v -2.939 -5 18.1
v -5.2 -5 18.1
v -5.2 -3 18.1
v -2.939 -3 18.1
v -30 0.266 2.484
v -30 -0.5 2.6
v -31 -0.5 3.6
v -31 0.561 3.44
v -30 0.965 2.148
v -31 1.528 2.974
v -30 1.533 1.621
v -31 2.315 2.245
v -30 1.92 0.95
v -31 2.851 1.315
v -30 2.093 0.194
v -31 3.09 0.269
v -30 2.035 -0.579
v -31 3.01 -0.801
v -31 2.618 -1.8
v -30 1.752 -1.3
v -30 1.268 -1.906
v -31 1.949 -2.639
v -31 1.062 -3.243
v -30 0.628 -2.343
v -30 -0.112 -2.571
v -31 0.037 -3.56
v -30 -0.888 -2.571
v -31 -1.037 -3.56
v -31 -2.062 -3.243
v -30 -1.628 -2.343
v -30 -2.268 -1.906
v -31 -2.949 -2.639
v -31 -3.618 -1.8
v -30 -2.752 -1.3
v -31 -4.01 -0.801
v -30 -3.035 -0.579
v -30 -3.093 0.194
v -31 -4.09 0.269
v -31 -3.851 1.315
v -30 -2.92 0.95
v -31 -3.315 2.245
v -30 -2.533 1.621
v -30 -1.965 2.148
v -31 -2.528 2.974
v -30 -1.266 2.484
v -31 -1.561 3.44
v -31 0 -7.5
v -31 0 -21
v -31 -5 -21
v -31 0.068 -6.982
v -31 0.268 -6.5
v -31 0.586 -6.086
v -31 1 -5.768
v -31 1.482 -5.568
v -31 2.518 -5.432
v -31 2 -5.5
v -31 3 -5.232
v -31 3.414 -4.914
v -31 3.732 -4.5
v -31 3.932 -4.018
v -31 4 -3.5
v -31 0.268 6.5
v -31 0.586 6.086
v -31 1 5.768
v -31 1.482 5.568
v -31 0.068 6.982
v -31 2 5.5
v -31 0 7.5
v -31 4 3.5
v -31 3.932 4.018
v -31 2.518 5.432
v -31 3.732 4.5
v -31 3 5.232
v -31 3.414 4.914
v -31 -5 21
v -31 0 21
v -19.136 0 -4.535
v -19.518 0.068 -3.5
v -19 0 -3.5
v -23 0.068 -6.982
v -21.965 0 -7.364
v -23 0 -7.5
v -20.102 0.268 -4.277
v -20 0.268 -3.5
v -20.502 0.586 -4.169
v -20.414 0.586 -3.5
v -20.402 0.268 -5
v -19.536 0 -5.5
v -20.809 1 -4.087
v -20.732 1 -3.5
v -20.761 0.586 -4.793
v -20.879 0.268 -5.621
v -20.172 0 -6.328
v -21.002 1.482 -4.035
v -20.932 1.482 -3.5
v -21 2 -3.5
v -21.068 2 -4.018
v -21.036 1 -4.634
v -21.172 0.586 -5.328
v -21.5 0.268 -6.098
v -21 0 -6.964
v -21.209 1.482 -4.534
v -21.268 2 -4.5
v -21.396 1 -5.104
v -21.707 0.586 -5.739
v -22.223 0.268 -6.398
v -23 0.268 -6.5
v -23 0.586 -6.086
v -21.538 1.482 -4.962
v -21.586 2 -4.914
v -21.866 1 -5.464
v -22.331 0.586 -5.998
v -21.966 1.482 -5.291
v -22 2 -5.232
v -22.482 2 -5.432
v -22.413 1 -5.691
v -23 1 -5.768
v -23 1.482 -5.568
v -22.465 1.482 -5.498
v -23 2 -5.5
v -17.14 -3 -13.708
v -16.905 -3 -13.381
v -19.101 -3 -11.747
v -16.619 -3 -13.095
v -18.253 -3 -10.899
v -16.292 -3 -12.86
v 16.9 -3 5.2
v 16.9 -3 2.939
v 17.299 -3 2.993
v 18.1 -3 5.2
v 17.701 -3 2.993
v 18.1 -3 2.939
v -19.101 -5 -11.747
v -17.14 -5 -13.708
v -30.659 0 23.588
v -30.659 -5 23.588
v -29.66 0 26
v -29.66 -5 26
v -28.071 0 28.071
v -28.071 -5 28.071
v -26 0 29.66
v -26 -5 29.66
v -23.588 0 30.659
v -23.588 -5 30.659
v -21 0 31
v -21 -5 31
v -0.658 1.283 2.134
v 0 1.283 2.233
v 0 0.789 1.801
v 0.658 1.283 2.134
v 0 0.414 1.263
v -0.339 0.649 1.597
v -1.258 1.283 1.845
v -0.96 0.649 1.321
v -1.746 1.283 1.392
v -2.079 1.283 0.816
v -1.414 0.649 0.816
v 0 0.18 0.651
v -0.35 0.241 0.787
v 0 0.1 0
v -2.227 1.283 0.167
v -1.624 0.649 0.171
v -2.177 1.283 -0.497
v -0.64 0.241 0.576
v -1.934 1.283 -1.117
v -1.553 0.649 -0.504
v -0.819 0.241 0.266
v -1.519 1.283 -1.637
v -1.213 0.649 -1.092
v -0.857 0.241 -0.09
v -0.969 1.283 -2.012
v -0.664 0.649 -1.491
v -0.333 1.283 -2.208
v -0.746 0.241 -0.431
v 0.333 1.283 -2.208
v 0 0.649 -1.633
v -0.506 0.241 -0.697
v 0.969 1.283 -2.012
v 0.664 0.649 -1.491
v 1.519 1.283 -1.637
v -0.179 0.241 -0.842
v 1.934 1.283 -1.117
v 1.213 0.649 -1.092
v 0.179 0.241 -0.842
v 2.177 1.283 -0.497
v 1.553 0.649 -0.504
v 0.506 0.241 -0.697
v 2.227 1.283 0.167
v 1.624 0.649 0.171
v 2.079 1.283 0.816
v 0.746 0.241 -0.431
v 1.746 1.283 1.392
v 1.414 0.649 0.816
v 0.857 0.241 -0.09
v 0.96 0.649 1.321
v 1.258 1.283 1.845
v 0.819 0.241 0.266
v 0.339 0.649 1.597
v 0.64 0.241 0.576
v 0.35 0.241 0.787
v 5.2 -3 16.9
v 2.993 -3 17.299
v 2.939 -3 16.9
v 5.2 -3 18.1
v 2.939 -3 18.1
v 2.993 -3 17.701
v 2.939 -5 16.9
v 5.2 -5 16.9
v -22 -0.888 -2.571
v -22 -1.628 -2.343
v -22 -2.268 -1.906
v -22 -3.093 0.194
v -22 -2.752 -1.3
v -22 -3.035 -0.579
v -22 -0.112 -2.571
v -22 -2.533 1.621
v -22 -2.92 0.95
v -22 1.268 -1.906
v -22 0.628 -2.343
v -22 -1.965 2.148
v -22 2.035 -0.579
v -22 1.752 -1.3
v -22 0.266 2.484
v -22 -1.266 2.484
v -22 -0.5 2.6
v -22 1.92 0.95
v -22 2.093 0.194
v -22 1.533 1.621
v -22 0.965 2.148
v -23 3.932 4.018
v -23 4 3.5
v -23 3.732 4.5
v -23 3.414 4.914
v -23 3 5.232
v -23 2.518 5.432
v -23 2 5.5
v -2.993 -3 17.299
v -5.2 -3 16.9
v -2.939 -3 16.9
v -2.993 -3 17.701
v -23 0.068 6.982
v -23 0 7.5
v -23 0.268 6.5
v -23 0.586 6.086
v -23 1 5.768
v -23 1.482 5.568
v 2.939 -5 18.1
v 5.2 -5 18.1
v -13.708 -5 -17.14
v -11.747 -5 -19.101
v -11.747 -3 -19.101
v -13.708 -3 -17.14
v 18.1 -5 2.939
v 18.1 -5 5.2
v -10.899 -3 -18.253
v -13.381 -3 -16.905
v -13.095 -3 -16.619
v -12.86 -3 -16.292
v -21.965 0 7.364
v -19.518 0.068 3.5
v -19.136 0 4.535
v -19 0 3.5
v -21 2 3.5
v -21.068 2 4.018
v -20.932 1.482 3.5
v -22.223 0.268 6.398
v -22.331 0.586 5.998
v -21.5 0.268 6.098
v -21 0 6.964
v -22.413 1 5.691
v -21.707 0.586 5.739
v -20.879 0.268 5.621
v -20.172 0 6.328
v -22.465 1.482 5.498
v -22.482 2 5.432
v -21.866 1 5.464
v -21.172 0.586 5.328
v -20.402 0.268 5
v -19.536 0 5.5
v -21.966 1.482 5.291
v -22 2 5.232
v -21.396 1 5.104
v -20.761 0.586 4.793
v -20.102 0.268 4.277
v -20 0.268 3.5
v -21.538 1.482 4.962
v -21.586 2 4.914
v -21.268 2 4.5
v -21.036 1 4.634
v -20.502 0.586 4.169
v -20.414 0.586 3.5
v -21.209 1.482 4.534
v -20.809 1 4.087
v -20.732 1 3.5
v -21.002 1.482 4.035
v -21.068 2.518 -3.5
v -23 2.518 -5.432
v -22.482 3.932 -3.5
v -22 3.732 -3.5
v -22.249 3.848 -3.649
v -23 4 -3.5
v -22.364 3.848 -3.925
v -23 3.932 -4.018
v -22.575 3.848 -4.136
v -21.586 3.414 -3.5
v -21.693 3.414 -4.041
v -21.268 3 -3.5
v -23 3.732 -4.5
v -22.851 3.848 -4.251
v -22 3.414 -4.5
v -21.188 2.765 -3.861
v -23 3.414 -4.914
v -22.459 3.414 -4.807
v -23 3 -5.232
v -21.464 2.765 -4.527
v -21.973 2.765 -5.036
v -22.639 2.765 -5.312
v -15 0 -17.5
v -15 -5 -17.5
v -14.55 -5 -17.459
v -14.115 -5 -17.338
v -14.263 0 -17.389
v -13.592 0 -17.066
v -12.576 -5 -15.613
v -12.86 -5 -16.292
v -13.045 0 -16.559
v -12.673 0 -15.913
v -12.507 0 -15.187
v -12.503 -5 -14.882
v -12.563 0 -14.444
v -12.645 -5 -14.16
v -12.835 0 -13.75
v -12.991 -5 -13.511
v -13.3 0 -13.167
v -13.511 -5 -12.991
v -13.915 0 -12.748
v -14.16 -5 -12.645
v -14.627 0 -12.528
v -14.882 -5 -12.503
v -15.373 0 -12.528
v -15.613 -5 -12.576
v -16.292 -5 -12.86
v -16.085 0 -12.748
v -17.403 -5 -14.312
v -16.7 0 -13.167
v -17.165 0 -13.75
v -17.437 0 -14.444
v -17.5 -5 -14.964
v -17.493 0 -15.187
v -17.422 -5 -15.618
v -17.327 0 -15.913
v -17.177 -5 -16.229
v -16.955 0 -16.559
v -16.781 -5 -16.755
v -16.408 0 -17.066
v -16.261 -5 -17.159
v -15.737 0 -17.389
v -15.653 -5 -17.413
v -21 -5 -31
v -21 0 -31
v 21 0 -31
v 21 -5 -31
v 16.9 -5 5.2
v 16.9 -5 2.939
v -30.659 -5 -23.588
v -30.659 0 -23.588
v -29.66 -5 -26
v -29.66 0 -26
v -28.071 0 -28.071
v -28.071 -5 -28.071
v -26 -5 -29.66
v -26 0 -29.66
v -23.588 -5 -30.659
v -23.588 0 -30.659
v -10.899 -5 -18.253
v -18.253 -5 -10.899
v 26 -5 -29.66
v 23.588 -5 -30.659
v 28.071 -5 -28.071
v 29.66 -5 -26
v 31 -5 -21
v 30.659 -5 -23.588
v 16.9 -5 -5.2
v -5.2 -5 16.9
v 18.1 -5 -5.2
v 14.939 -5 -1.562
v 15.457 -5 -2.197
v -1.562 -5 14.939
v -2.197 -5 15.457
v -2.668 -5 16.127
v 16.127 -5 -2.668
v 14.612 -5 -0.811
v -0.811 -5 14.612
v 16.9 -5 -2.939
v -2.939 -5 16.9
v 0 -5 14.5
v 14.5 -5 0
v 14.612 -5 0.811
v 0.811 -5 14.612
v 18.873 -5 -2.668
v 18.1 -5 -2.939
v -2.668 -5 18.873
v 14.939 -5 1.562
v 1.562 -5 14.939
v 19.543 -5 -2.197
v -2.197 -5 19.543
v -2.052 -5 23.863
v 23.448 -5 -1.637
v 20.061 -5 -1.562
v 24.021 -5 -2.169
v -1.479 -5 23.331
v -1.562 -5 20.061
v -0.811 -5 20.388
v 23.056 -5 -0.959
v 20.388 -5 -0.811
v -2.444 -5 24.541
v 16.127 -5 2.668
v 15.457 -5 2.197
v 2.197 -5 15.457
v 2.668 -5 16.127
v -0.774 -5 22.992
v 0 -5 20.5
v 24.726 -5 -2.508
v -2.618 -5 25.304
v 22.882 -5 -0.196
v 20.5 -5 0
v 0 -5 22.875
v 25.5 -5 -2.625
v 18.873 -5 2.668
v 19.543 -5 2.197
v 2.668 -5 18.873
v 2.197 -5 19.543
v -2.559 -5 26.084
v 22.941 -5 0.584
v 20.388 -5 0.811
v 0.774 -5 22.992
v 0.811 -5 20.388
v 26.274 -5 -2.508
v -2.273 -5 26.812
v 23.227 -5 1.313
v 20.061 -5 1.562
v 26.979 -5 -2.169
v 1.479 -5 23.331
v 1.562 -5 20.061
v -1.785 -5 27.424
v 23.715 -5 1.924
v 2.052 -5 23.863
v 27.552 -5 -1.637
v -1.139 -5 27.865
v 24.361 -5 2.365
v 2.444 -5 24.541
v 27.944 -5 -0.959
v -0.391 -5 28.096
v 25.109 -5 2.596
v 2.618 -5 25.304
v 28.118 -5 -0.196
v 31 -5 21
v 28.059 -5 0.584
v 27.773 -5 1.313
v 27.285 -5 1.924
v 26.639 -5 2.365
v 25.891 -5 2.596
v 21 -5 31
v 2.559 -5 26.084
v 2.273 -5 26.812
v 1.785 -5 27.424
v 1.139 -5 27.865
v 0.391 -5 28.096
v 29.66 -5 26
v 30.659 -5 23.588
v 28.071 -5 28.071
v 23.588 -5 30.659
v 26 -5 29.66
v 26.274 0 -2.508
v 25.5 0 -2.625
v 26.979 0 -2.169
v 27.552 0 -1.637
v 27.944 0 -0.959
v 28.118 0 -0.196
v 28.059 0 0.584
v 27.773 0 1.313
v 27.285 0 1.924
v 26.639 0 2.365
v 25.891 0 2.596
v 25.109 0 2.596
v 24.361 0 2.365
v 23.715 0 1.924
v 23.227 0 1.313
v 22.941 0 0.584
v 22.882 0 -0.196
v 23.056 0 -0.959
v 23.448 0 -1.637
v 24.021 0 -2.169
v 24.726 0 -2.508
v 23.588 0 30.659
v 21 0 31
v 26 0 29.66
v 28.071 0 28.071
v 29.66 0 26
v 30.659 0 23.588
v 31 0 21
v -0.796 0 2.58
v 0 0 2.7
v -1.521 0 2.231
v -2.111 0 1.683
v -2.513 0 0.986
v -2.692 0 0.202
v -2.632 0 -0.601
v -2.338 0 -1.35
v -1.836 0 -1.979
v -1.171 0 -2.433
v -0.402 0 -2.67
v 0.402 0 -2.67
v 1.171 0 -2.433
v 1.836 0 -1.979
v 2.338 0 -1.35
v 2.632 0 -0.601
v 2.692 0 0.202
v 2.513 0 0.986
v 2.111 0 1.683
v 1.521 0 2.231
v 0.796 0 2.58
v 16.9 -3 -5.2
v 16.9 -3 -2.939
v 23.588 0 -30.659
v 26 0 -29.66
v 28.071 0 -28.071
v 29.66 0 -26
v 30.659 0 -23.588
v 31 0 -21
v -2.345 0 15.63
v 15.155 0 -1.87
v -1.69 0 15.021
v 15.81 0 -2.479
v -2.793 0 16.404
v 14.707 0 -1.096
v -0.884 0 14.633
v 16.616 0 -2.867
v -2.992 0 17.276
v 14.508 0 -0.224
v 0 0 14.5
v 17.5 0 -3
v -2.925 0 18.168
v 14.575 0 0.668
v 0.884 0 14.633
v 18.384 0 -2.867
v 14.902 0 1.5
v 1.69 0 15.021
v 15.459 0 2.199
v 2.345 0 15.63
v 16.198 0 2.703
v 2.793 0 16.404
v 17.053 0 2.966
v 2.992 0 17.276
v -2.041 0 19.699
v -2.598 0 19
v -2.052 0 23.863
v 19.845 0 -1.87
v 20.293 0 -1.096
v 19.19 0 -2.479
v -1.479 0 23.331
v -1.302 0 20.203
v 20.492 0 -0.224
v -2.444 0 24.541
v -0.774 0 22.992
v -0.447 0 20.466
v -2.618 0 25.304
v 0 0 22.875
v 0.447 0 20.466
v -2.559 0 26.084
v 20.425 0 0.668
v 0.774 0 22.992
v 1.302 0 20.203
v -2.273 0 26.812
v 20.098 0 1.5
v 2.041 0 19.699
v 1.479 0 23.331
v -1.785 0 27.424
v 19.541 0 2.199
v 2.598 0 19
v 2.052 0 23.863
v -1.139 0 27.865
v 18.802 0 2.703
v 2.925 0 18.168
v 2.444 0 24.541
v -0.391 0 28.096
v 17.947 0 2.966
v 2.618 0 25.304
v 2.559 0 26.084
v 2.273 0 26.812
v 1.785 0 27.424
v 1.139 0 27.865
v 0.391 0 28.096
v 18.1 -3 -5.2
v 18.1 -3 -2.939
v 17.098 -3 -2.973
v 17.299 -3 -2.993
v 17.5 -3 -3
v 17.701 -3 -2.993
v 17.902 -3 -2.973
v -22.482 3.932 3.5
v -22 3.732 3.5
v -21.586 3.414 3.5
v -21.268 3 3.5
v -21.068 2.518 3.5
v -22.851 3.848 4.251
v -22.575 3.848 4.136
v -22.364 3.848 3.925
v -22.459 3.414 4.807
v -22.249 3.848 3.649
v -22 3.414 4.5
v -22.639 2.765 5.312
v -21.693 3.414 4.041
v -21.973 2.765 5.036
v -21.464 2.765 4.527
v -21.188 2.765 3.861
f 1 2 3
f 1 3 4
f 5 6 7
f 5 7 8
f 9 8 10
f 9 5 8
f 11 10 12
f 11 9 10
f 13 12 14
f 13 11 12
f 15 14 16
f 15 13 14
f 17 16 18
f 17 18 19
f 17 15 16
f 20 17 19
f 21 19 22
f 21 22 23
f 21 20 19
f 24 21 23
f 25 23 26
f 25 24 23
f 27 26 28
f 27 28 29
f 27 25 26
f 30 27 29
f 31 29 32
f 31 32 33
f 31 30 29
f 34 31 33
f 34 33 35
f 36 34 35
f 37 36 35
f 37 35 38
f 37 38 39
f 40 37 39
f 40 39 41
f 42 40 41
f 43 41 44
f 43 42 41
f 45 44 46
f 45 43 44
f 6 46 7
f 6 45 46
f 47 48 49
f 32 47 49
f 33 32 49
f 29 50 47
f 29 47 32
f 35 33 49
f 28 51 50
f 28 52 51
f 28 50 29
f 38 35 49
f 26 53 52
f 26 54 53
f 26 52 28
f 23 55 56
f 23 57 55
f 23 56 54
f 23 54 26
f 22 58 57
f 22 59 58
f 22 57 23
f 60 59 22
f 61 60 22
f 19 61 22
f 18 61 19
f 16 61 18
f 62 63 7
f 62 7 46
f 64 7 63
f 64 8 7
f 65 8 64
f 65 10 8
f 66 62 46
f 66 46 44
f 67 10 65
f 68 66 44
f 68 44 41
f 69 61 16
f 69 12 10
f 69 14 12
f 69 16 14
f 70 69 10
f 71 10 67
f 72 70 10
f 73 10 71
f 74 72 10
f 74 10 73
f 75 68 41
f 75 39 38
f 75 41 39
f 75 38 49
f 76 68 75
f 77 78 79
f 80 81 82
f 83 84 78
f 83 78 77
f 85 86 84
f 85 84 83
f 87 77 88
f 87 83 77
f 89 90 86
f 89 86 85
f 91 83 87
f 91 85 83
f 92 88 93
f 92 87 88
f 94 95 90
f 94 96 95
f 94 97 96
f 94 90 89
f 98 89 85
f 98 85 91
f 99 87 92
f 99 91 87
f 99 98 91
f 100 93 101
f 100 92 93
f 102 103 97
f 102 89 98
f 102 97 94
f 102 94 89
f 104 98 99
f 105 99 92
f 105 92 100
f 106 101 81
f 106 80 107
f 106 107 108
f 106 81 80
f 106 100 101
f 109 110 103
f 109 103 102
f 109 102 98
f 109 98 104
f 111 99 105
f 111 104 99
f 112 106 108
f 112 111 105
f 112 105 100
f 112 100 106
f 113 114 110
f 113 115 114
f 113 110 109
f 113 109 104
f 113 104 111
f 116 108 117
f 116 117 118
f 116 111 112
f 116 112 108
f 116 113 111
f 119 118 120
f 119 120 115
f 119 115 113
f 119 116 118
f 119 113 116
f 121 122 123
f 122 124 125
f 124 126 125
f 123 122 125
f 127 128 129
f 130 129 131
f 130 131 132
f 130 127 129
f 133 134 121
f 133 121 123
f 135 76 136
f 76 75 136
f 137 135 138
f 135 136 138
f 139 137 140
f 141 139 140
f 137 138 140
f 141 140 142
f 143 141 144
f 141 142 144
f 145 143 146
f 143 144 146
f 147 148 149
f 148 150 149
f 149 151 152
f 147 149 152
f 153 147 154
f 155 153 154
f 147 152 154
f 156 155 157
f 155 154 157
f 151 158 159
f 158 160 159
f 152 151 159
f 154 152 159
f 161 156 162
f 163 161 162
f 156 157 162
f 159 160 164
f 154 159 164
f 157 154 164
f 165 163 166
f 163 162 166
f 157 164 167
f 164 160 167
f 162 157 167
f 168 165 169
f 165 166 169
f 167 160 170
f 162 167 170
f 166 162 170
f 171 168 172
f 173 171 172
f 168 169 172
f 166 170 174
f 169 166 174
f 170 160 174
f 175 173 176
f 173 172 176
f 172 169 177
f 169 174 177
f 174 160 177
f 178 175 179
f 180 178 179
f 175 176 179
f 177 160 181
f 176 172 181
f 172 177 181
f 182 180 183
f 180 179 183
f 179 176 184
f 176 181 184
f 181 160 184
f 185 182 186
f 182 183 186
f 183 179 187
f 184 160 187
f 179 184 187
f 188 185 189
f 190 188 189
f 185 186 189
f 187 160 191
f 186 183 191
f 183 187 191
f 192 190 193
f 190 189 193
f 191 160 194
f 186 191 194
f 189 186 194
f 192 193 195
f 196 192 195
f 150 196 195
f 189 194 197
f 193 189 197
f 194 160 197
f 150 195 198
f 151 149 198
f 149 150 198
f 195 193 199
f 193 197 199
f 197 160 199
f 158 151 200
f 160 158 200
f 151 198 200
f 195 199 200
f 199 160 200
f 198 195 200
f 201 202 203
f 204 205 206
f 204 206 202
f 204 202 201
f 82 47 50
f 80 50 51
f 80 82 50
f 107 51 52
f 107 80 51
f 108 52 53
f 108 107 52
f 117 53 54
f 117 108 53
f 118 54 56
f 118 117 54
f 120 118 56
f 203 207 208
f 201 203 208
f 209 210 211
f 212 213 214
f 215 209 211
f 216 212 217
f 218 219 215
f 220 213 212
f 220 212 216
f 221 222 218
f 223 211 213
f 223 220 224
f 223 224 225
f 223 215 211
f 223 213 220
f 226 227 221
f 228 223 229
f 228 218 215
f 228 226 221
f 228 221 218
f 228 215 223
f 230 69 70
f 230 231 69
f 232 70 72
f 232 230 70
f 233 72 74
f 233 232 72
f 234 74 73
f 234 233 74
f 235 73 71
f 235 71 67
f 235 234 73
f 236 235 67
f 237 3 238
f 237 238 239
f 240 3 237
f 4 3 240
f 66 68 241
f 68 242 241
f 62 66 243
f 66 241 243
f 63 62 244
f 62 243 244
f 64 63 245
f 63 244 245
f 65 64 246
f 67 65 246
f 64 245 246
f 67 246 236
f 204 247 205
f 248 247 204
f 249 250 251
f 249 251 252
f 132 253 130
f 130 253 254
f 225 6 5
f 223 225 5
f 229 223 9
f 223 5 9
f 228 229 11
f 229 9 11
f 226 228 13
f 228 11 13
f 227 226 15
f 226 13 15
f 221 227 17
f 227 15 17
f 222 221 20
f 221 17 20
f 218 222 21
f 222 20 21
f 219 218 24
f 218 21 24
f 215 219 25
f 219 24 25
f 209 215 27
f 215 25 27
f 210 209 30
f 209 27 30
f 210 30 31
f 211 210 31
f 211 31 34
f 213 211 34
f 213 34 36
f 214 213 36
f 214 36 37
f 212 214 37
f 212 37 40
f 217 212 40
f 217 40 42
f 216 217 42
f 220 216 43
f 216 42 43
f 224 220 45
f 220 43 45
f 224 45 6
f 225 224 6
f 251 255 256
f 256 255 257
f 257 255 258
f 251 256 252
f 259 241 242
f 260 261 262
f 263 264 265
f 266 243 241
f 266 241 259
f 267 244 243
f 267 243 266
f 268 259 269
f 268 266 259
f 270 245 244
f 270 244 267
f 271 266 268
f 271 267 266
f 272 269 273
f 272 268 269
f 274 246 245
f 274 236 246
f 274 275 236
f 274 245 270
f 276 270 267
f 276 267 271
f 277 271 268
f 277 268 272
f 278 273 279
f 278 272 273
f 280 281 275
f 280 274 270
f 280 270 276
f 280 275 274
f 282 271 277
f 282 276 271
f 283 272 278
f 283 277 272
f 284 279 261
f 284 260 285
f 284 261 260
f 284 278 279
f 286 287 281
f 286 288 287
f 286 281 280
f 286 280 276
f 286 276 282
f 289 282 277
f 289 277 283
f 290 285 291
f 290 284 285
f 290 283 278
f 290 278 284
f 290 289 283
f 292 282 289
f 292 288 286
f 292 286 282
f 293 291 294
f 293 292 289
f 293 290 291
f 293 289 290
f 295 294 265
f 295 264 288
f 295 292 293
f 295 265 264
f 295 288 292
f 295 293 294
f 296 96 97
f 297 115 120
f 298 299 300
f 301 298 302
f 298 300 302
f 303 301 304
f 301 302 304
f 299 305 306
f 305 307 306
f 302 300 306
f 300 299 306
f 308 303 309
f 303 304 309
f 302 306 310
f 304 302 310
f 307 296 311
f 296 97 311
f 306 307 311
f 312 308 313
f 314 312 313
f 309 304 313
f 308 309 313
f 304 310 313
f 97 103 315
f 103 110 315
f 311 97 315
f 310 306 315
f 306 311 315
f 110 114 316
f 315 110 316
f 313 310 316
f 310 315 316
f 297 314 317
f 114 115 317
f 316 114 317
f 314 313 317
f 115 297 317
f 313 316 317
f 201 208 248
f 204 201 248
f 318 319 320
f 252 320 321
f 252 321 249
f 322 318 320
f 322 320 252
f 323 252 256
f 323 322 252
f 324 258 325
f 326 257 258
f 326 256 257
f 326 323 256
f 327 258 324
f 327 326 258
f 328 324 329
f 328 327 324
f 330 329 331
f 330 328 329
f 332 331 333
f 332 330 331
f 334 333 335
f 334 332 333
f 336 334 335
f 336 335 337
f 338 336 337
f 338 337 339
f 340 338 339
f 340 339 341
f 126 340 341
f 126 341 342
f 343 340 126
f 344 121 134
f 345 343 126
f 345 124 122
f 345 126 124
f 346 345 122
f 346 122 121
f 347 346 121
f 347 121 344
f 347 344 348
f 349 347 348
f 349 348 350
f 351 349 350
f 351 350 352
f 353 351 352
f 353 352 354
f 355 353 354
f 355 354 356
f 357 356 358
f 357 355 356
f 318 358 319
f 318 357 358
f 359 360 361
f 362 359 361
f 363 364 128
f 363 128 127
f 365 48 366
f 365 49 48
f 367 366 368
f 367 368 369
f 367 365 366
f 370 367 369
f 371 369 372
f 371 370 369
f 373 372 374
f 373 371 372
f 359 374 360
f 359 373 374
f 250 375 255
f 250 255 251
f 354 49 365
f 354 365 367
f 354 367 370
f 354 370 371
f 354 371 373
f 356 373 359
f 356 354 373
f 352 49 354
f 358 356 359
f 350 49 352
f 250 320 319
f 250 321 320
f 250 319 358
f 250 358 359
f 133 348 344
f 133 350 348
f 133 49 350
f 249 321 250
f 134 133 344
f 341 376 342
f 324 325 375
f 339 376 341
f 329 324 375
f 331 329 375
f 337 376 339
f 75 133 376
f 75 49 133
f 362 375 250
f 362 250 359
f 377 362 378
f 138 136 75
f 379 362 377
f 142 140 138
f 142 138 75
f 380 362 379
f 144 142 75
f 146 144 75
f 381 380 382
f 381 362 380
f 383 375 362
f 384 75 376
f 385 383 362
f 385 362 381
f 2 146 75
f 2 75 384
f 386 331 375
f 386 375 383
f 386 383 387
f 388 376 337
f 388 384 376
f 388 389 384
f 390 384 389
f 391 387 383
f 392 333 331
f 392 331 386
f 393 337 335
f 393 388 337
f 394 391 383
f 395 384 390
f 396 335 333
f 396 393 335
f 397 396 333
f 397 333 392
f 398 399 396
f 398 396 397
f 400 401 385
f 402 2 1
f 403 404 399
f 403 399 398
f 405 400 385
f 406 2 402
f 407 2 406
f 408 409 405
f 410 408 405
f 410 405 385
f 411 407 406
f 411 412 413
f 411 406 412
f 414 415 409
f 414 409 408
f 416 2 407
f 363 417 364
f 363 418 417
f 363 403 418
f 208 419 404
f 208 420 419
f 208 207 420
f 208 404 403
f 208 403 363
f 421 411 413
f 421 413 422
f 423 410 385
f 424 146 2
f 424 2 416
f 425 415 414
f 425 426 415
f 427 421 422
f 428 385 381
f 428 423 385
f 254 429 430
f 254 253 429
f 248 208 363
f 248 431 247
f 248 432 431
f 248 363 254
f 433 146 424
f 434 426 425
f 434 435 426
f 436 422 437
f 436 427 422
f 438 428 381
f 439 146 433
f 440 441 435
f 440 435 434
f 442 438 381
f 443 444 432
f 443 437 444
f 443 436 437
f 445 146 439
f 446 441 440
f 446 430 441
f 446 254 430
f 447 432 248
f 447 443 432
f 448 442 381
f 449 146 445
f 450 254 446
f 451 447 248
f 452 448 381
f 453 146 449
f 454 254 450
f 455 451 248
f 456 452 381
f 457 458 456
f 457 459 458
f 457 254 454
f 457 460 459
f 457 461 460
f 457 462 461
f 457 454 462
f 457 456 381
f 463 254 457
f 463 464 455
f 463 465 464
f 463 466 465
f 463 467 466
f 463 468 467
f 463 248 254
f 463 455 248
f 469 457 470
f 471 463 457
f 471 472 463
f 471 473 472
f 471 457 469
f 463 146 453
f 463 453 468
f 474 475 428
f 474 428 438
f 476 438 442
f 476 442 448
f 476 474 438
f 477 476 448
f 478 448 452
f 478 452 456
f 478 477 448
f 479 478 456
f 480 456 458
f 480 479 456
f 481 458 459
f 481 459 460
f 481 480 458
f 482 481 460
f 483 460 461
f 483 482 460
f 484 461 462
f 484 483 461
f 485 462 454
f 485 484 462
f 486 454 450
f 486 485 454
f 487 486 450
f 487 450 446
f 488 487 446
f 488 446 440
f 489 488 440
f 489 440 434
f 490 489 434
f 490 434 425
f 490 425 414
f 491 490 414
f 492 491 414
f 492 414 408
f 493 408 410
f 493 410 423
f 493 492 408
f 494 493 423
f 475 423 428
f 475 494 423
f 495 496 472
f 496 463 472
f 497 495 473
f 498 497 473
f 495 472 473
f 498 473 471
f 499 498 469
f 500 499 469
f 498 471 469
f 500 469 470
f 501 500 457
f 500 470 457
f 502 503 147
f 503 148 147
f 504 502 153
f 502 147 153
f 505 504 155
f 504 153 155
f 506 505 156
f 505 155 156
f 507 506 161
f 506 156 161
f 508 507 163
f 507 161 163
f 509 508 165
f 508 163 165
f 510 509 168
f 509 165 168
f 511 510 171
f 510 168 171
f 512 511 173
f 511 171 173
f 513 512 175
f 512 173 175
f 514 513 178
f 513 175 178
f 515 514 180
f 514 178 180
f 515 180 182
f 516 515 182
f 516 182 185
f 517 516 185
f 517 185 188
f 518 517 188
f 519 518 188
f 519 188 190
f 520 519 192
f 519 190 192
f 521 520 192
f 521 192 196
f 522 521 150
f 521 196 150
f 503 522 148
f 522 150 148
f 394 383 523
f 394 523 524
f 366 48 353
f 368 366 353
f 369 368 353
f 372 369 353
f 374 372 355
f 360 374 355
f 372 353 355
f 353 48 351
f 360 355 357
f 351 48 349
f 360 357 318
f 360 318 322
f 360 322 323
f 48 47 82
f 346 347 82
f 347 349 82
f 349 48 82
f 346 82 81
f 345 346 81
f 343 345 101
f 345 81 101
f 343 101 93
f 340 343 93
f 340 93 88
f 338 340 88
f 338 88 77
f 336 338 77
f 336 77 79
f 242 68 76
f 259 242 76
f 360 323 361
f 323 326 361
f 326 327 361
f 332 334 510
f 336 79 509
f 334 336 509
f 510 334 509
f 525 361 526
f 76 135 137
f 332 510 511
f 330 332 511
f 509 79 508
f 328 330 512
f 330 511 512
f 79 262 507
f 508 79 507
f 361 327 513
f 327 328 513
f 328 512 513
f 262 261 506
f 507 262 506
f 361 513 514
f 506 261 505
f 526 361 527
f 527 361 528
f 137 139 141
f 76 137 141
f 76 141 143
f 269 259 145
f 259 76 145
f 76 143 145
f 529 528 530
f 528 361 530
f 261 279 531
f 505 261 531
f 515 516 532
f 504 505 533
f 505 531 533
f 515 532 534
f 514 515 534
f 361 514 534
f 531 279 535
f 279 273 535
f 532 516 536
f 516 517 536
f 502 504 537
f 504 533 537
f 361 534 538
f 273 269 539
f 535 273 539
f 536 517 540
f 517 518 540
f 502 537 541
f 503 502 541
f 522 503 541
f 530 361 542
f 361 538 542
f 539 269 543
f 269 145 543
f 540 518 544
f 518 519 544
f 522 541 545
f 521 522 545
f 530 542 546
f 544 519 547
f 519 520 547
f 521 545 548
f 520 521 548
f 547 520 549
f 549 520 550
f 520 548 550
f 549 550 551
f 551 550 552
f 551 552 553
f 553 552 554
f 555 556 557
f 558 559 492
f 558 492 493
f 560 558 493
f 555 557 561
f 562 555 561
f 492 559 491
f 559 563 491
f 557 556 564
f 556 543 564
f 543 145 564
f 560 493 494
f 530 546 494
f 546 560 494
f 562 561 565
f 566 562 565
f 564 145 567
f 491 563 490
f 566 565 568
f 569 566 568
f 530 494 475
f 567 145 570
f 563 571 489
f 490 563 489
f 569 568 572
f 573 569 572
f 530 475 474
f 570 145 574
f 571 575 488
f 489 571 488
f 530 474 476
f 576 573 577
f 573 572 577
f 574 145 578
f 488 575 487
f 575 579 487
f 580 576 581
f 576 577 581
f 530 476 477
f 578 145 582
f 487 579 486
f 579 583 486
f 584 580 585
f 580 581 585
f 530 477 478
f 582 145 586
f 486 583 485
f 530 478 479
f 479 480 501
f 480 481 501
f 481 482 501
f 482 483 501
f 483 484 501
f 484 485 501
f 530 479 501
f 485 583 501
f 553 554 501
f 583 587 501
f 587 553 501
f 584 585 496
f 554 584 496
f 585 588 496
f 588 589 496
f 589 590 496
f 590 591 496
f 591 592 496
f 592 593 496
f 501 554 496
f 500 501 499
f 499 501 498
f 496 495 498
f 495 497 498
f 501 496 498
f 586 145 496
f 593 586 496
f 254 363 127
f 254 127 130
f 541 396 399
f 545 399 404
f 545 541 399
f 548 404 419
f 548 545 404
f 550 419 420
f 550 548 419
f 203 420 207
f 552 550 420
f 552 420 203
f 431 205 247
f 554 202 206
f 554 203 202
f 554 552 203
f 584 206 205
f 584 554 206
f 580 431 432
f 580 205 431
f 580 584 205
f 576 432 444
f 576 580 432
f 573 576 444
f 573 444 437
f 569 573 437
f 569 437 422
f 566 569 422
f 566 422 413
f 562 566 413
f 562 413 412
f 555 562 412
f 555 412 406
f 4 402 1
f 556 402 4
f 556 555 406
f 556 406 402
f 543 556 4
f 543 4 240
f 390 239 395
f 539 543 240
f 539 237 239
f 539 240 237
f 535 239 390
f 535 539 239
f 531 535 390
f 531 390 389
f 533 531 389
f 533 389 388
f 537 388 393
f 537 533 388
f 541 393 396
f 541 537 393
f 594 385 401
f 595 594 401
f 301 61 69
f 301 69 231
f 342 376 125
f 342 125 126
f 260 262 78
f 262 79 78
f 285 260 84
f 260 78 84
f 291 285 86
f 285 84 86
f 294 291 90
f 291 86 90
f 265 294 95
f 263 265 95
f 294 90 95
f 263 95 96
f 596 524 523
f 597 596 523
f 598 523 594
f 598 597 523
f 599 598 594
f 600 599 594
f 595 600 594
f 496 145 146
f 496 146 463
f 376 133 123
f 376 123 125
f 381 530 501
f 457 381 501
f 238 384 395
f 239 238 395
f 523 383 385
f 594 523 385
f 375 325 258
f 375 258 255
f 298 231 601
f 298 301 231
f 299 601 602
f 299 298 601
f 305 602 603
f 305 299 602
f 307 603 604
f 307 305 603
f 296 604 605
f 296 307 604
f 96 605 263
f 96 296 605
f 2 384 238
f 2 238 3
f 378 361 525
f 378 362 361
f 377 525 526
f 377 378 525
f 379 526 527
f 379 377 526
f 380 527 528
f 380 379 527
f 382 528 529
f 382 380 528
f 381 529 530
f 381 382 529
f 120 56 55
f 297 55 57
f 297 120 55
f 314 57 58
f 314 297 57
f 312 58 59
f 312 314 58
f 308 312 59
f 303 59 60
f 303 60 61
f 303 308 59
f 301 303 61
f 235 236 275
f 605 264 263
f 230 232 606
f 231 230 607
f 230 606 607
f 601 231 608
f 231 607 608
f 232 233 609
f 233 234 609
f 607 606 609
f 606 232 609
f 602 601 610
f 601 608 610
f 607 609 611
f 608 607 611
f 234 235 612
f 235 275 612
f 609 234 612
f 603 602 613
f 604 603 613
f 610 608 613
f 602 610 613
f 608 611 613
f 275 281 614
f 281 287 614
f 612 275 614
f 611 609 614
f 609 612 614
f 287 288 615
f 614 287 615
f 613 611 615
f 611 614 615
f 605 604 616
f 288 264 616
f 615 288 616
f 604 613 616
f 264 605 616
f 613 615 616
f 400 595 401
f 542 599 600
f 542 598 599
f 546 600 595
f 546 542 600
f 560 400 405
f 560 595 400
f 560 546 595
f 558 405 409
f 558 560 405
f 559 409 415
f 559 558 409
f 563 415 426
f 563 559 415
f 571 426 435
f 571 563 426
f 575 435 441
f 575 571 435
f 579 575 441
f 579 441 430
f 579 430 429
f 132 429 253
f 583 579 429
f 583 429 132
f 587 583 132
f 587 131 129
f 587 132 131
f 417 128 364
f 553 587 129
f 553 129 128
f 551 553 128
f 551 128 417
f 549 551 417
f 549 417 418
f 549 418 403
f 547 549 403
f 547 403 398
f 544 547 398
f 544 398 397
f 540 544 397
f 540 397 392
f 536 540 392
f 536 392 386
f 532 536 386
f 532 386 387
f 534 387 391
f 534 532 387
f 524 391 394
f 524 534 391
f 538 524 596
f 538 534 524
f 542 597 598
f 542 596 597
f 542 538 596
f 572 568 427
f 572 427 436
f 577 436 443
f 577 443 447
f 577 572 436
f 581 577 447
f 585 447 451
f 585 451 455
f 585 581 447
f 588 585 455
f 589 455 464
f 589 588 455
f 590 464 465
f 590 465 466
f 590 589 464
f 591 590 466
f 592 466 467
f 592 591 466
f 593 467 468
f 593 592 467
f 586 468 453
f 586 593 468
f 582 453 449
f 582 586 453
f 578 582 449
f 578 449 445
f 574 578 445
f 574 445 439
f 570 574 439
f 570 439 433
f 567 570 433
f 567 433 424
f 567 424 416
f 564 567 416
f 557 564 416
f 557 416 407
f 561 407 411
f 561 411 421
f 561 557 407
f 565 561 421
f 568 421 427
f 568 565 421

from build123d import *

# Parameters (mm, degrees)
SKETCH4_W           = 62
SKETCH4_H           = 62
SKETCH4_R           = 3
SKETCH4_R_2         = 2.5
SKETCH4_R_3         = 2.625
BOSS_EXTRUDE2_DEPTH = 5
SKETCH5_W           = 10.4
SKETCH5_H           = 1.2
SKETCH5_W_2         = 1.2
SKETCH5_H_2         = 10.4
CUT_EXTRUDE1_DEPTH  = 2
FILLET1_R           = 10
SKETCH6_W           = 10
SKETCH6_H           = 11
BOSS_EXTRUDE3_DEPTH = 4
SKETCH7_R           = 2.6
CUT_EXTRUDE2_DEPTH  = 9
CHAMFER1_SIZE       = 1
FILLET2_R           = 2


with BuildPart() as part:
    # Sketch3 → Revolve1 (revolve)
    with BuildSketch(Plane.XY, mode=Mode.PRIVATE) as revolve1_sk:
        with BuildLine():
            Line((0, 0), (2.7, 0))
            Line((2.7, 0), (2.233206222, 1.282505364))
            ThreePointArc((2.233206222, 1.282505364), (1.26348021, 0.413869711), (0, 0.1))
            Line((0, 0.1), (0, 0))
        make_face()
    revolve(revolve1_sk.sketch.rotate(Axis((0, 0.1, 0), (0, -1, 0)), 90), axis=Axis((0, 0.1, 0), (0, -1, 0)))

    # Sketch4 → Boss-Extrude2 (add)
    with BuildSketch(Plane.XZ):
        Rectangle(SKETCH4_W, SKETCH4_H)
        with Locations(Location((17.5, 0, 0), (0, 0, 270))):
            Circle(SKETCH4_R, mode=Mode.SUBTRACT)
        with Locations(Location((0, 17.5, 0), (0, 0, 270))):
            Circle(SKETCH4_R, mode=Mode.SUBTRACT)
        with Locations(Location((-15, -15, 0), (0, 0, 270))):
            Circle(SKETCH4_R_2, mode=Mode.SUBTRACT)
        with Locations(Location((0, 25.5, 0), (0, 0, 270))):
            Circle(SKETCH4_R_3, mode=Mode.SUBTRACT)
        with Locations(Location((25.5, 0, 0), (0, 0, 270))):
            Circle(SKETCH4_R_3, mode=Mode.SUBTRACT)
    extrude(amount=BOSS_EXTRUDE2_DEPTH)

    # Sketch5 → Cut-Extrude1 (cut)
    with BuildSketch(Plane.XZ.offset(5)):
        with Locations((0, 17.5)):
            Rectangle(SKETCH5_W, SKETCH5_H)
        with Locations((17.5, 0)):
            Rectangle(SKETCH5_W_2, SKETCH5_H_2)
        Polygon((-18.252691193, -10.898780669), (-10.898780669, -18.252691193), (-11.747308807, -19.101219331), (-19.101219331, -11.747308807), align=None)
    extrude(amount=-CUT_EXTRUDE1_DEPTH, mode=Mode.SUBTRACT)

    # Fillet1
    fillet1_edges = [part.edges().sort_by_distance(p)[0] for p in [
        (31, -2.5, -31),
        (31, -2.5, 31),
        (-31, -2.5, 31),
        (-31, -2.5, -31),
    ]]
    fillet(fillet1_edges, radius=FILLET1_R)

    # Sketch6 → Boss-Extrude3 (add)
    with BuildSketch(Plane(origin=(0, 0, 0), x_dir=(1, 0, 0), z_dir=(0, 1, 0))):
        with Locations((-26, 0)):
            Rectangle(SKETCH6_W, SKETCH6_H)
    extrude(amount=BOSS_EXTRUDE3_DEPTH)

    # Sketch7 → Cut-Extrude2 (cut)
    with BuildSketch(Plane.ZY.offset(31)):
        with Locations((0, -0.5)):
            Circle(SKETCH7_R)
    extrude(amount=-CUT_EXTRUDE2_DEPTH, mode=Mode.SUBTRACT)

    # Chamfer1
    chamfer1_edges = [part.edges().sort_by_distance(p)[0] for p in [
        (-31, -0.5, -2.6),
    ]]
    chamfer(chamfer1_edges, length=CHAMFER1_SIZE)

    # Fillet2
    fillet2_edges = [part.edges().sort_by_distance(p)[0] for p in [
        (-26, 0, 5.5),
        (-21, 0, 0),
        (-21, 2, 5.5),
        (-26, 0, -5.5),
        (-21, 2, -5.5),
        (-26, 4, 5.5),
        (-21, 4, 0),
        (-26, 4, -5.5),
    ]]
    fillet(fillet2_edges, radius=FILLET2_R - 0.0001)  # a hair under: the kernel refuses the full size


solid = part.part
